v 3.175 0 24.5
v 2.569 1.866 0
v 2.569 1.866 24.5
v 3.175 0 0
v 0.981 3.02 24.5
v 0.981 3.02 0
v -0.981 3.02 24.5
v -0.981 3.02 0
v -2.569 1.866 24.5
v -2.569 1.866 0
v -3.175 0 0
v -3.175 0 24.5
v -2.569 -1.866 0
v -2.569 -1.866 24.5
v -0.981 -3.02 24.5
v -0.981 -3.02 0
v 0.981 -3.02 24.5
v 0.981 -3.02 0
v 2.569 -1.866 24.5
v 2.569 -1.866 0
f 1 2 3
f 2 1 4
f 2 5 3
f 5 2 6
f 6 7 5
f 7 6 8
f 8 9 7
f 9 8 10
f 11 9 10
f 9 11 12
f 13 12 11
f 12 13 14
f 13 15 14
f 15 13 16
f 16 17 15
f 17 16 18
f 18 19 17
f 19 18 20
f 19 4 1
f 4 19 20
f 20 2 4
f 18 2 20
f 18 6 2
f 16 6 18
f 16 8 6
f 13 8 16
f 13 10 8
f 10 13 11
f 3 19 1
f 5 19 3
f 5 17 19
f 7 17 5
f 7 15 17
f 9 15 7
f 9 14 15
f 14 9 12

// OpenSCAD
/*
	Threaded rod for camera mounts, Clearance Holes, and Nuts for NutTraps.

	1/4" - 20 Unified National Coarse class 1A, (British Standard Witworth also fits).

	This thread is used for rangefinder camera, roll film cameras (also DSLRs) up to medium format cameras, quick release plates and panoramic heads.

	As per the standard is ISO 1222:2010 the bolt extends 4.5 mm into the camera body. 

	3/8" - 16 Unified National Coarse, British Standard Witworth.
	Some medium format cameras and almost all large size cameras as well as most of the connectors between tripods and panoramic heads use this thread.

	This work is licensed under the Creative Commons Attribution-NonCommercial-ShareAlike 4.0 International License. To view a copy of this license, visit http://creativecommons.org/licenses/by-nc-sa/4.0/.

*/

// Variables for 1/4" 
RodDia = 6.35;			// Diameter of the Bolt
NutH = 4.4;				// 11/64" = 4.365625 mm
NutDia = 12.84;			//  7/16" across flats

/*
// Variables for 3/8" 
RodDia = 9.53;			// Diameter of the Bolt
NutH = 6.35;			//  1/4" = 6.35 mm
NutDia = 16.5;			// 9/16" across flats
*/

module CameraNut()
{
	// Use for nut trap
	cylinder(d = NutDia, h = NutH, $fn = 6);
}

module BlankCameraHole()
{
	// Round hole 1mm bigger than accross corners.
	cylinder(d = NutDia + 1, h = NutH);
}

module CameraRod(Length = 24.5)
{
	// Blank Rod
	cylinder(d = RodDia, h = Length);
}

module CameraBolt(Length)
{
	// Assembled Bolt
	translate([0,0,-NutH])
	{
		CameraNut();
		CameraRod(RodDia, Length);
	}
}

CameraRod(24.5);
